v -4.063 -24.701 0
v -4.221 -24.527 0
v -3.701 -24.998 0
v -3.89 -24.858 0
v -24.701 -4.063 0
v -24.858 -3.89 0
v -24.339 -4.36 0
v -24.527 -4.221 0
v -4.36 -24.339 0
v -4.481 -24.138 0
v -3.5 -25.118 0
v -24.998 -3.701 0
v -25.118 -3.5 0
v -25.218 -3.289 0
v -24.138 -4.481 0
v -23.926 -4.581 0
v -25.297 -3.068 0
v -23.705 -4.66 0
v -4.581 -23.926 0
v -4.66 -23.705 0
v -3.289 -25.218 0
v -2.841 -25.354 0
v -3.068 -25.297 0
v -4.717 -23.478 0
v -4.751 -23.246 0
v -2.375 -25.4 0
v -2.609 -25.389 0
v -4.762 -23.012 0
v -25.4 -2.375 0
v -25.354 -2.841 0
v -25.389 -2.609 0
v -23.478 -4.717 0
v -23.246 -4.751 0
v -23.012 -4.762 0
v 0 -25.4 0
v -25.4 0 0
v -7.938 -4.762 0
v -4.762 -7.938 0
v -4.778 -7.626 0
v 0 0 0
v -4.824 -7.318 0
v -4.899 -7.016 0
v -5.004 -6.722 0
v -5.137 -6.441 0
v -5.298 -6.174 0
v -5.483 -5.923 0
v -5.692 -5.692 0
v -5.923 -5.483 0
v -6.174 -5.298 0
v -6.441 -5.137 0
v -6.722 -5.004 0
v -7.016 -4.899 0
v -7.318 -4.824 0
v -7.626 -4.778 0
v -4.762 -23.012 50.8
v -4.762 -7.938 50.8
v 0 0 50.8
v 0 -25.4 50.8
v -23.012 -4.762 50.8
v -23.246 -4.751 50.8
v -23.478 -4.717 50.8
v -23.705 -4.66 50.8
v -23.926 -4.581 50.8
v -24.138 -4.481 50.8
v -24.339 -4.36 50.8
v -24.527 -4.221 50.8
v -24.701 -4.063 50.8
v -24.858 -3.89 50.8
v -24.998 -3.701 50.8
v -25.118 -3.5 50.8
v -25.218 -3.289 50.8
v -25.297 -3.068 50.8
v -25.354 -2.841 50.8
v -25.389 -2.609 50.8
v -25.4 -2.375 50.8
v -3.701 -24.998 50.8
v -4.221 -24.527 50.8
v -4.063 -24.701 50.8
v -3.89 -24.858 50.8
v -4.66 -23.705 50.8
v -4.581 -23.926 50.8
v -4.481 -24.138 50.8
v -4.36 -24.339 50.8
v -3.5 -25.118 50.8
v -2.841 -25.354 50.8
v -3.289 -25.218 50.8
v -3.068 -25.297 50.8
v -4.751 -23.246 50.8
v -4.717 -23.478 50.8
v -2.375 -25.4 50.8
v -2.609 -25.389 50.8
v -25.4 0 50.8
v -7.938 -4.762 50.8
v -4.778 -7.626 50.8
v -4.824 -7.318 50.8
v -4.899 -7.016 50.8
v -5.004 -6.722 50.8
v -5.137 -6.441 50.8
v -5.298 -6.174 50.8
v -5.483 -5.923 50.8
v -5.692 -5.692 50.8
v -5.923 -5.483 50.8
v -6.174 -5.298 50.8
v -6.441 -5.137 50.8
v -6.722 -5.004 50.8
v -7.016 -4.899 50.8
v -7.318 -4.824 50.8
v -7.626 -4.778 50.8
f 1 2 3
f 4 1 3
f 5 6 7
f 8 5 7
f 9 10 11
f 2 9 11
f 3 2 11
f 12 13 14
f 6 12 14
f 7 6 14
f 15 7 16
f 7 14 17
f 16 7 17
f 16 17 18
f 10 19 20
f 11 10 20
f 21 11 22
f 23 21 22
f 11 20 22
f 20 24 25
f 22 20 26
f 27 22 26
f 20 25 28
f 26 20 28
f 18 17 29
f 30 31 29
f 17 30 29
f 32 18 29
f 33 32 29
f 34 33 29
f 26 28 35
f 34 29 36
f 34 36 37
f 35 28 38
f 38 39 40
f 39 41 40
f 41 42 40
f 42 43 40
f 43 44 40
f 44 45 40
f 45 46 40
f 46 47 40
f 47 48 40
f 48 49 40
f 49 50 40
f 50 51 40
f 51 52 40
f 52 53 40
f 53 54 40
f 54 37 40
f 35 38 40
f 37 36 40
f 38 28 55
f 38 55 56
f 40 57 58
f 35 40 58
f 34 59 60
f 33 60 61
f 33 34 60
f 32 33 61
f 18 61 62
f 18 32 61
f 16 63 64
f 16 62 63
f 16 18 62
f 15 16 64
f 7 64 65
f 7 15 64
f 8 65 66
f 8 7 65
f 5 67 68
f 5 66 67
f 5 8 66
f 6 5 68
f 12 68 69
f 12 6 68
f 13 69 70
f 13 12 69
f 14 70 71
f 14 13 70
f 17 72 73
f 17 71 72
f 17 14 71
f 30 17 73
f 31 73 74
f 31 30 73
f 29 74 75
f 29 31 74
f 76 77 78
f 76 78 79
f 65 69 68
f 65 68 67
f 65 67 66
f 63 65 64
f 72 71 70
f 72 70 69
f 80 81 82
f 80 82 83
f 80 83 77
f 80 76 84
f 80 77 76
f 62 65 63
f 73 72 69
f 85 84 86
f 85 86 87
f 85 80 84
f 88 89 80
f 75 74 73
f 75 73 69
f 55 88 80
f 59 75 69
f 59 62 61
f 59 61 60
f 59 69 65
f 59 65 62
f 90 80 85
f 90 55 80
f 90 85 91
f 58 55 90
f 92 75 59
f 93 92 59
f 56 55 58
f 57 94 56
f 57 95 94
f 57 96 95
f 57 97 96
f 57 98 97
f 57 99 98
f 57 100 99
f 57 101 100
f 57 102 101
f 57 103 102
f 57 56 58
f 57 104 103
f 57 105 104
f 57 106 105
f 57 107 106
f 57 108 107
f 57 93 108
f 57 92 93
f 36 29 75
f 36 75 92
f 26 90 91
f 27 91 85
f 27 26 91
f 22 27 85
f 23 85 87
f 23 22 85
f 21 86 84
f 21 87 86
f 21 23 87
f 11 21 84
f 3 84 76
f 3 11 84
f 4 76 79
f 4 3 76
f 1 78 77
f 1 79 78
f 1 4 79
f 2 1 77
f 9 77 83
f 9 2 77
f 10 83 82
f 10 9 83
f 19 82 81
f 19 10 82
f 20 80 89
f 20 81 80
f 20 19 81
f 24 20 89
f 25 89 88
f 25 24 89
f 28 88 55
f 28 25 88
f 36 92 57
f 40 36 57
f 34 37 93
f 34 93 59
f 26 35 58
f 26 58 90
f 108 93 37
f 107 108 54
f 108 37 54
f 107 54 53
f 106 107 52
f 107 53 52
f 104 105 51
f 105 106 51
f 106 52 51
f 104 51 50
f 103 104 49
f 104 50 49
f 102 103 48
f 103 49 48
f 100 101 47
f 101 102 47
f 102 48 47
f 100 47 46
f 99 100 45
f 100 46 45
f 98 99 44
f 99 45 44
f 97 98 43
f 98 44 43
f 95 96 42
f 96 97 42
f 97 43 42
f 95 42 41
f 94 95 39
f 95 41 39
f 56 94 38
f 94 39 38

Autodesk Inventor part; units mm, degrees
ref_plane "YZ Plane" through (0, 0, 0) normal (1, 0, 0) x (0, 1, 0)
ref_plane "XZ Plane" through (0, 0, 0) normal (0, 1, 0) x (-1, 0, 0)
ref_plane "XY Plane" through (0, 0, 0) normal (0, 0, 1) x (1, 0, 0)
sketch "Sketch1" plane through (0, 0, 0) normal (0, 0, 1) x (1, 0, 0)
  line L0 (0, 0) -> (0, -25.4)
  line L1 (0, -25.4) -> (-2.3749, -25.4)
  line L2 (-4.7625, -23.0124) -> (-4.7625, -7.9375)
  line L3 (-7.9375, -4.7625) -> (-23.0124, -4.7625)
  line L4 (-25.4, -2.3749) -> (-25.4, 0)
  line L5 (-25.4, 0) -> (0, 0)
  arc A0 (-4.7625, -7.9375) -> (-7.9375, -4.7625) centre (-7.9375, -7.9375) ccw
  arc A1 (-25.4, -2.3749) -> (-23.0124, -4.7625) centre (-23.0124, -2.3749) ccw
  arc A2 (-4.7625, -23.0124) -> (-2.3749, -25.4) centre (-2.3749, -23.0124) ccw
  dimension "d2" = 25.4
  dimension "d3" = 4.7625
  dimension "d4" = 3.175
  dimension "d5" = 2.3876
extrude "Extrusion1" add sketch "Sketch1" along normal blind 50.8
properties part number "GE-12026-06"
